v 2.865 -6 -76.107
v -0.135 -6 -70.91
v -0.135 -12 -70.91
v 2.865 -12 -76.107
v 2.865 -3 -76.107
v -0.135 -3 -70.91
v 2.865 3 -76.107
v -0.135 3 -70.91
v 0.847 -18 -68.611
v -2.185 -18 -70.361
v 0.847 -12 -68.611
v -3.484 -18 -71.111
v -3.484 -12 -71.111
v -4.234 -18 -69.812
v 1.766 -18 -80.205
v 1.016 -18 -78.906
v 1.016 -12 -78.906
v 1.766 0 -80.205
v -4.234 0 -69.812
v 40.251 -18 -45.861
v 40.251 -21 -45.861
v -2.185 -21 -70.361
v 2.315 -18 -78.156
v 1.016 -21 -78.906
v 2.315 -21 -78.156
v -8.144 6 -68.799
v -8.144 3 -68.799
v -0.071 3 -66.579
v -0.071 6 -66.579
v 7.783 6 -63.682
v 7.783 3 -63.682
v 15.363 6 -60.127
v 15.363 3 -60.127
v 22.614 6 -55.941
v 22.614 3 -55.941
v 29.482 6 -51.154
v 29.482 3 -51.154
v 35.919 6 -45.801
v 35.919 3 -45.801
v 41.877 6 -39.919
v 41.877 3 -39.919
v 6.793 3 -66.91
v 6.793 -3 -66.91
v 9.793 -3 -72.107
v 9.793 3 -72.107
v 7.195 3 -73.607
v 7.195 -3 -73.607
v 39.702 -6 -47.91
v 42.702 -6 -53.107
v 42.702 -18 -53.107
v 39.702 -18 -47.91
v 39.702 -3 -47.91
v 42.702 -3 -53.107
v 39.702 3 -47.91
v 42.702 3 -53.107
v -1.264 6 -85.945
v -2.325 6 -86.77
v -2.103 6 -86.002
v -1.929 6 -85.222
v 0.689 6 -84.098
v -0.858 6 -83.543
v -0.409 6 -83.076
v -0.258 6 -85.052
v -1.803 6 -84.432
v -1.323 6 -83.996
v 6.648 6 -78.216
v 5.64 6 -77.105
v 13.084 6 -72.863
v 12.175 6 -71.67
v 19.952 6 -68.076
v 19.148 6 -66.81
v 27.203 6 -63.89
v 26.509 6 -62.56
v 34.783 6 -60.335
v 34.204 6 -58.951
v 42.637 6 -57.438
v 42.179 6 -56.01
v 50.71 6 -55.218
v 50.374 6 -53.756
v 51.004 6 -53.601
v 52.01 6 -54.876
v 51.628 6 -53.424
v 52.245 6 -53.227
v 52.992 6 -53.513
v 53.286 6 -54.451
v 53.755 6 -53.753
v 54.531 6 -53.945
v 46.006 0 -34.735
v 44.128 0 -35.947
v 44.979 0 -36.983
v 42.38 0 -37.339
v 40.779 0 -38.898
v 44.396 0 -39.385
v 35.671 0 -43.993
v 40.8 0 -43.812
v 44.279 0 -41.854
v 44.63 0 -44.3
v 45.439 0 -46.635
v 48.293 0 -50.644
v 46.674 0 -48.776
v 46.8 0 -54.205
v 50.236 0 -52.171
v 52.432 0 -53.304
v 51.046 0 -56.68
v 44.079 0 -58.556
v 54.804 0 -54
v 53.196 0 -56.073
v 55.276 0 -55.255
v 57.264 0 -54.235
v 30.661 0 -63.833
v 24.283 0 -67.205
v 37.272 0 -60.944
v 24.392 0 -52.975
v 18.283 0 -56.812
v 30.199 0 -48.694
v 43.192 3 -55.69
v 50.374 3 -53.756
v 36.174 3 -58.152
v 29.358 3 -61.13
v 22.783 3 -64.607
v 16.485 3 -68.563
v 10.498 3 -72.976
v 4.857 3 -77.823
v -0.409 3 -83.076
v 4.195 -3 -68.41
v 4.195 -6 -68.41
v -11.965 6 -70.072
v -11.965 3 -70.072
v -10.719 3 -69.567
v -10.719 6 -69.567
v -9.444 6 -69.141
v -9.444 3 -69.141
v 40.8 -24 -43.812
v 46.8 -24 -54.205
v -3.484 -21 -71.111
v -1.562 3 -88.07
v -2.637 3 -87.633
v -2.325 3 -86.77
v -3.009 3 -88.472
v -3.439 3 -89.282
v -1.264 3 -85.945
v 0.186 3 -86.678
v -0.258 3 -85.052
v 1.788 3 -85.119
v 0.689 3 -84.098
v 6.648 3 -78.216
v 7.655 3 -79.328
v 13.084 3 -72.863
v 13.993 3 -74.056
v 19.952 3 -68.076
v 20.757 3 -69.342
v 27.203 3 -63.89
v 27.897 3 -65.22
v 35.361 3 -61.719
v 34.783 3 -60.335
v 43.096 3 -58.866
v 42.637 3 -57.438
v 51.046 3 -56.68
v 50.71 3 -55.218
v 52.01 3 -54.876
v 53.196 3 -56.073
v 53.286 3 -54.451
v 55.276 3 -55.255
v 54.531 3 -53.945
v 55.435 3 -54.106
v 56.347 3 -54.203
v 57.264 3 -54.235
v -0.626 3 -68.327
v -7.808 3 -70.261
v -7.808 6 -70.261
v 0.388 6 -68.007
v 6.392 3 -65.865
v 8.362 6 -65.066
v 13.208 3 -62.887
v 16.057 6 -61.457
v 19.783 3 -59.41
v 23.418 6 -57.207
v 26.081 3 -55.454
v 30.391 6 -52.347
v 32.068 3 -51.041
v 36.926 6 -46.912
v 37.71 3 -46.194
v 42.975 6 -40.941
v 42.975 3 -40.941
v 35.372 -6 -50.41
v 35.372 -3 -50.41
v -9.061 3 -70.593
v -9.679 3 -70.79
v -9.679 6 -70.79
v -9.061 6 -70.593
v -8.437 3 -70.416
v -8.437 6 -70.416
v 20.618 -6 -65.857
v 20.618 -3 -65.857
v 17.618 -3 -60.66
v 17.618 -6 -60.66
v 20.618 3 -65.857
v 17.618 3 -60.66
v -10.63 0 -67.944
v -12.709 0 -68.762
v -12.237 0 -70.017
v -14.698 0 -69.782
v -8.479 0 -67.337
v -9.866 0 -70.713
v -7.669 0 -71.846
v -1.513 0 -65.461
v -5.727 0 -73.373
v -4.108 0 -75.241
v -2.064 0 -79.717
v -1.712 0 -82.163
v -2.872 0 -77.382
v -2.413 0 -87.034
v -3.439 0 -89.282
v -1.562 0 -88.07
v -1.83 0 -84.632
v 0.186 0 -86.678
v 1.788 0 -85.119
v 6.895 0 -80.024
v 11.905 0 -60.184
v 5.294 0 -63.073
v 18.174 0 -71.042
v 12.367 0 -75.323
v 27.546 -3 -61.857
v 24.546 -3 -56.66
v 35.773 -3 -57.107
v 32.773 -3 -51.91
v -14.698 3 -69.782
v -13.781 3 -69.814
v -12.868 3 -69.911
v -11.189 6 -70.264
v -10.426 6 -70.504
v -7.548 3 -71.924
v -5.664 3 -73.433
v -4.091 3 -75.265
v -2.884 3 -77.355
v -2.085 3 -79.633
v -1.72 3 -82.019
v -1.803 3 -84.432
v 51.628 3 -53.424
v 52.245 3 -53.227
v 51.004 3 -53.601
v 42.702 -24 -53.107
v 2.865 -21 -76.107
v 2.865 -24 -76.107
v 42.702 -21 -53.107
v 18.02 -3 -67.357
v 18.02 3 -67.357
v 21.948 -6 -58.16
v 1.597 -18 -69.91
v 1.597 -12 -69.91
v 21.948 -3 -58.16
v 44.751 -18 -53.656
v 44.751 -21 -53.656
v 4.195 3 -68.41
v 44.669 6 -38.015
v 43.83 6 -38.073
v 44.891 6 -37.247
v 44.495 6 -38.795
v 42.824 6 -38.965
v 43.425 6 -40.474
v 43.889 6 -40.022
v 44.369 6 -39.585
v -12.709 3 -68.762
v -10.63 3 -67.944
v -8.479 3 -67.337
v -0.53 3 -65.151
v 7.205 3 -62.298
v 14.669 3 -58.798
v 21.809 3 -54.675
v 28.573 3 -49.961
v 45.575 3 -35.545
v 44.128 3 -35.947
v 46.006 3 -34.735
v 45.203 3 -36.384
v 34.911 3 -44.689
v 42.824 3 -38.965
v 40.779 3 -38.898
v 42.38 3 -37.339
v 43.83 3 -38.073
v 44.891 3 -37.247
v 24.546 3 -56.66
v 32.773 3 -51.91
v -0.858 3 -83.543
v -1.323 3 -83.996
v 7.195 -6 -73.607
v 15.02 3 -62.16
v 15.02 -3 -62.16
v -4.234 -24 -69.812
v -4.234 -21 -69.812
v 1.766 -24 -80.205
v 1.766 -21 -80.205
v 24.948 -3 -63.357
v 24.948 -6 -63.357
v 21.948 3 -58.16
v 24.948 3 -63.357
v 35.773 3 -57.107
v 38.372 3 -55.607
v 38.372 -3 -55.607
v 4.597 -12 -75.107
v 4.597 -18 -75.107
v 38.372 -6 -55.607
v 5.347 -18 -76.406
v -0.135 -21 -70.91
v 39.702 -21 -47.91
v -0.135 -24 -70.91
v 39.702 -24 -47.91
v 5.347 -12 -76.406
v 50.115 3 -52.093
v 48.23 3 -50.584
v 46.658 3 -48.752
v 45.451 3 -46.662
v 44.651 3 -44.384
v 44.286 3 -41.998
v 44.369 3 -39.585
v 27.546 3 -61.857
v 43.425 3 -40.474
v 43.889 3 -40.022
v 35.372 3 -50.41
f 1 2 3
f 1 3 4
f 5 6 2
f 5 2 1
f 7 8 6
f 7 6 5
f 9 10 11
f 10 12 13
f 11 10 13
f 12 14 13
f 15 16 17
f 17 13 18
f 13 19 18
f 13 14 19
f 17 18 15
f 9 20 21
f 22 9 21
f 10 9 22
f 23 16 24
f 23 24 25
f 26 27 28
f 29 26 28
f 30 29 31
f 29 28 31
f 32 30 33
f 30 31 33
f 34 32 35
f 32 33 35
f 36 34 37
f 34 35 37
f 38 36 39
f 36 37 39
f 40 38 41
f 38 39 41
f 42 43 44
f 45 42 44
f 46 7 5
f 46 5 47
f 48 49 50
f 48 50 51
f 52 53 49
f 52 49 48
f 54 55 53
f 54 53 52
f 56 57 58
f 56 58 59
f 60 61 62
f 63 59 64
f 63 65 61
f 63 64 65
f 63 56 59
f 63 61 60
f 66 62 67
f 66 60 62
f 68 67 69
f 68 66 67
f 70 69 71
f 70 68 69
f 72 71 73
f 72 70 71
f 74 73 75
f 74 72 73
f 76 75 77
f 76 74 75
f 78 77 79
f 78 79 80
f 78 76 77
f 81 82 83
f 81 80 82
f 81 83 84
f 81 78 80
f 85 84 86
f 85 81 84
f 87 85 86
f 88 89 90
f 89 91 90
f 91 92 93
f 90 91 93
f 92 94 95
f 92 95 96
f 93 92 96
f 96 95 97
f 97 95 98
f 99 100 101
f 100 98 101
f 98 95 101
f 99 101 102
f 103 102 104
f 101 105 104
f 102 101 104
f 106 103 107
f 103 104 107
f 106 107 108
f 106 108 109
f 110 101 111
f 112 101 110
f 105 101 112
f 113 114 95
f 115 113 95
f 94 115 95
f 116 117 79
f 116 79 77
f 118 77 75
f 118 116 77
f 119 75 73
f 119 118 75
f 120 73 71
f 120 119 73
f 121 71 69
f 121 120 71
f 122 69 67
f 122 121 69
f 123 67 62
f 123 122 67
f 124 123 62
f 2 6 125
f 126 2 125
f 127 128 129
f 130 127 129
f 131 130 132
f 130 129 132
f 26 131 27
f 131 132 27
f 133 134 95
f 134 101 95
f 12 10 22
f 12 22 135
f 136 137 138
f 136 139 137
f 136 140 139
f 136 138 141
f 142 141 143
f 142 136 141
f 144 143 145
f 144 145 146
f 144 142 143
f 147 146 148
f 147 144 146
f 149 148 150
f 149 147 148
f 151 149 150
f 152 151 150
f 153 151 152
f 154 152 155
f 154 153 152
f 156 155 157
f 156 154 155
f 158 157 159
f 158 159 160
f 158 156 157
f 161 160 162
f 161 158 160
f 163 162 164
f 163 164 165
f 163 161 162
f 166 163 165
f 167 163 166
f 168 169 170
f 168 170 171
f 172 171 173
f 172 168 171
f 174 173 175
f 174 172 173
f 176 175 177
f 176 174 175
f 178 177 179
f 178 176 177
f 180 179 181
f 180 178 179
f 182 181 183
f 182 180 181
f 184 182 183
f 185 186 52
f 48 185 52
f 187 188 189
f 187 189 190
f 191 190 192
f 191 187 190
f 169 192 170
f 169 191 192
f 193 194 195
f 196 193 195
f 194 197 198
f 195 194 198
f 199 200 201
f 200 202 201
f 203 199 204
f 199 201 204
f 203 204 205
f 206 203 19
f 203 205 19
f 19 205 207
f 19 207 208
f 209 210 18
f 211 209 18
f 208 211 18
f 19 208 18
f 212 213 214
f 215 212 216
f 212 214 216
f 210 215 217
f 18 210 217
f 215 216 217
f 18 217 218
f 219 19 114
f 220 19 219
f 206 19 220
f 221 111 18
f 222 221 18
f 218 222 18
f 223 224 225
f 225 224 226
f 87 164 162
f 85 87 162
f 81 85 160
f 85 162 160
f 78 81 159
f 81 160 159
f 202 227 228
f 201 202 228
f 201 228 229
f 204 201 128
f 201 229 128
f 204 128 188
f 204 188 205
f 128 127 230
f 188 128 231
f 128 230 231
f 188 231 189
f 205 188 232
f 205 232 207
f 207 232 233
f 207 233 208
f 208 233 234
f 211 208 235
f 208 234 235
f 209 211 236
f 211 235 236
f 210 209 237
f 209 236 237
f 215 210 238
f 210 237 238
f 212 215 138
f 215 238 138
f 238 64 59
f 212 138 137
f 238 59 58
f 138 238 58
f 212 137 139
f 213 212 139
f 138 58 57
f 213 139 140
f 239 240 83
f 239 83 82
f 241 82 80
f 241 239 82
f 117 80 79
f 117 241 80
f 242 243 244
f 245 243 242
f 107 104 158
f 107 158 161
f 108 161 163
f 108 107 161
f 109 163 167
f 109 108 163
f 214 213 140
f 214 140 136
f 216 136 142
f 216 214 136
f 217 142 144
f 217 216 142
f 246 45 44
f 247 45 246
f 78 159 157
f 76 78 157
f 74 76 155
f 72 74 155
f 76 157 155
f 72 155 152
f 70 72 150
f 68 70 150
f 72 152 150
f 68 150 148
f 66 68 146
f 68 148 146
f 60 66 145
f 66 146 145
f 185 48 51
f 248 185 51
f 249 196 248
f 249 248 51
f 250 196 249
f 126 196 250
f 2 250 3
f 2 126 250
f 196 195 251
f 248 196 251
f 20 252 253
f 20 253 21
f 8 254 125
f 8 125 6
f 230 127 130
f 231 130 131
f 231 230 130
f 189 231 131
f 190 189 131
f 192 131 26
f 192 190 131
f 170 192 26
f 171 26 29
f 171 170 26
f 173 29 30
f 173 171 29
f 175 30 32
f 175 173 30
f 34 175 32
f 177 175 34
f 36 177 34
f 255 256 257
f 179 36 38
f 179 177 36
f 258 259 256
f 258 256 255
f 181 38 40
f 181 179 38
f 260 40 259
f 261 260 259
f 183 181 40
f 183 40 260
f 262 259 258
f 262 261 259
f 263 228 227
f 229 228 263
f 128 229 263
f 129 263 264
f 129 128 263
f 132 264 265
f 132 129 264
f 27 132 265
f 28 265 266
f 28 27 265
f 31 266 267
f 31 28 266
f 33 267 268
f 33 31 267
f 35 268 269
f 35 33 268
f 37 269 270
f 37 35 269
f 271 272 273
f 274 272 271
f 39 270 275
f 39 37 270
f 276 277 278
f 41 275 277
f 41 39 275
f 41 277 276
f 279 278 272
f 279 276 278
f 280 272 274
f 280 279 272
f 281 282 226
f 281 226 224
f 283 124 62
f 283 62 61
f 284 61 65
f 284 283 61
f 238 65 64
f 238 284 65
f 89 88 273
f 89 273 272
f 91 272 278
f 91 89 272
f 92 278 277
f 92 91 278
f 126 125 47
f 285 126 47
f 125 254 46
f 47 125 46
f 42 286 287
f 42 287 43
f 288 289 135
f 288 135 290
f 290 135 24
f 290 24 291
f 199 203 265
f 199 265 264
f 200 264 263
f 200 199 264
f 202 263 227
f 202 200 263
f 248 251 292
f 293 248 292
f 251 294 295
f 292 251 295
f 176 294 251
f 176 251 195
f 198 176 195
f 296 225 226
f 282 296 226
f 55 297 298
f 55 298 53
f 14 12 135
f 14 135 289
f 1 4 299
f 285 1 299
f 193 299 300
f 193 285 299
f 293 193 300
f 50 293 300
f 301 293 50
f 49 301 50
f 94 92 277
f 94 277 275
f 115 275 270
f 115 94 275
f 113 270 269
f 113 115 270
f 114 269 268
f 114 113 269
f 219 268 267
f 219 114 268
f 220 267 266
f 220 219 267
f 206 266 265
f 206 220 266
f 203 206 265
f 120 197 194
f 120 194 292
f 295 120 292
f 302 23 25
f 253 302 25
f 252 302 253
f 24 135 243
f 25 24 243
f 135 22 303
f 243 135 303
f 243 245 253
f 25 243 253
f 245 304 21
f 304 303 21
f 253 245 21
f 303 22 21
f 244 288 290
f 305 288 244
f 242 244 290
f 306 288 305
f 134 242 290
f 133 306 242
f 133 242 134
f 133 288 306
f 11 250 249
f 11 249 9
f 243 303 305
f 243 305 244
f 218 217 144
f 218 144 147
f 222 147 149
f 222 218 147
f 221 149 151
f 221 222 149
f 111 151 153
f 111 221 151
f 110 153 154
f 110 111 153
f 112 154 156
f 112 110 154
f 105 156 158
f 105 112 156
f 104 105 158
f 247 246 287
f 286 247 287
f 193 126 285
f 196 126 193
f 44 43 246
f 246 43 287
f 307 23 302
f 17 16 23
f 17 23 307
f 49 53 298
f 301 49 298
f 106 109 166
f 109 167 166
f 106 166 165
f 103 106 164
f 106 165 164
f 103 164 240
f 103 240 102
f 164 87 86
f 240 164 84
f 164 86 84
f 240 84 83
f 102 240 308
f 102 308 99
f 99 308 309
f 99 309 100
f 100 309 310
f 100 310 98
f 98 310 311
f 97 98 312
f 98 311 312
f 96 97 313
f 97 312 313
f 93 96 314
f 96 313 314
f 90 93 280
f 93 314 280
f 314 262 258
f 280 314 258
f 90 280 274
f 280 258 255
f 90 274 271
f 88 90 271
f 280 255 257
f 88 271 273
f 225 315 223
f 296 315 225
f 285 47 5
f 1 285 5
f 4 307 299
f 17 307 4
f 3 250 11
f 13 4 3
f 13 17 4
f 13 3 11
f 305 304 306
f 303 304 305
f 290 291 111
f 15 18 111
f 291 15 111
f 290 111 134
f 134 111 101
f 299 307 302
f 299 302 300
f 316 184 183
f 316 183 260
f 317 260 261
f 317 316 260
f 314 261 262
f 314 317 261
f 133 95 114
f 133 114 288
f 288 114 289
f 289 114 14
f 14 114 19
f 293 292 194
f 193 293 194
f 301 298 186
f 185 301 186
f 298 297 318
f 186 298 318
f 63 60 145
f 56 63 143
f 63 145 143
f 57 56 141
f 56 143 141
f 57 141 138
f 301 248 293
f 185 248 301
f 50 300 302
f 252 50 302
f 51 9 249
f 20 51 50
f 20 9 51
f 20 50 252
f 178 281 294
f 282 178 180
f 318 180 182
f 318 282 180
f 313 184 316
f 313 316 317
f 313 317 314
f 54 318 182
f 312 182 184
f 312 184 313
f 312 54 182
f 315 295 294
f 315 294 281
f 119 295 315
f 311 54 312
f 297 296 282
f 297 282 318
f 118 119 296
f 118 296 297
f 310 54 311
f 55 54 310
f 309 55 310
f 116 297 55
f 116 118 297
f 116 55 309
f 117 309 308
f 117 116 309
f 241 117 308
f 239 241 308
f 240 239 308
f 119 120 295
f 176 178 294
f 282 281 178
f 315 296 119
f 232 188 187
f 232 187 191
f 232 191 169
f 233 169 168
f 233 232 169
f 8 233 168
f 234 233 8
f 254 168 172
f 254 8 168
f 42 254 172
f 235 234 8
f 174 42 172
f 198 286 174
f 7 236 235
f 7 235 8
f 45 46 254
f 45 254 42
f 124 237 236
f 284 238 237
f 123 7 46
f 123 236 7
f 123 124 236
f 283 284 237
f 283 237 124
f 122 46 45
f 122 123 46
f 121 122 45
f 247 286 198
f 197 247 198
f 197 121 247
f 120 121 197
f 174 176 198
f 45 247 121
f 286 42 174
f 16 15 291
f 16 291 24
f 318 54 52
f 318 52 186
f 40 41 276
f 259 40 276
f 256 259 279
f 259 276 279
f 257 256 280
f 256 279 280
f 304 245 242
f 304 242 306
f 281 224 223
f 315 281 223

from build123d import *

# Parameters (mm, degrees)
BOSS_EXTRUDE1_DEPTH  = 3
BOSS_EXTRUDE4_DEPTH  = 3
SKETCH11_R           = 13
CUT_EXTRUDE2_DEPTH   = 6.5
BOSS_EXTRUDE5_DEPTH  = 3
CUT_EXTRUDE3_DEPTH   = 24
BOSS_EXTRUDE6_DEPTH  = 3
BOSS_EXTRUDE7_DEPTH  = 6
CUT_EXTRUDE4_DEPTH   = 3
BOSS_EXTRUDE8_DEPTH  = 12
BOSS_EXTRUDE10_DEPTH = 3
BOSS_EXTRUDE11_DEPTH = 3
SKETCH21_W           = 9
SKETCH21_H           = 6
CUT_EXTRUDE5_DEPTH   = 5


with BuildPart() as part:
    # Sketch3 → Boss-Extrude1 (new body)
    with BuildSketch(Plane(origin=(0, 0, 0), x_dir=(1, 0, 0), z_dir=(0, 1, 0))):
        with BuildLine():
            ThreePointArc((-3.439345798, 89.282032024), (-25.956006297, 89.282032024), (-14.697676047, 69.782032024))
            ThreePointArc((-14.697676047, 69.782032024), (-5.505287892, 73.589643868), (-1.697676047, 82.782032024))
            ThreePointArc((-1.697676047, 82.782032024), (-2.140640306, 86.14667961), (-3.439345798, 89.282032024))
        make_face()
        with BuildLine():
            ThreePointArc((-3.439345798, 89.282032024), (-0.67063629, 87.395724301), (1.787544185, 85.119486633))
            ThreePointArc((1.787544185, 85.119486633), (24.283086066, 67.204681754), (51.045533135, 56.680373453))
            ThreePointArc((51.045533135, 56.680373453), (54.245903018, 55.689645548), (57.26384818, 54.23502664))
            ThreePointArc((57.26384818, 54.23502664), (46.005517931, 47.73502664), (46.005517931, 34.73502664))
            ThreePointArc((46.005517931, 34.73502664), (43.236808422, 36.621334362), (40.778627947, 38.89757203))
            ThreePointArc((40.778627947, 38.89757203), (18.283086066, 56.812376909), (-8.479361003, 67.336685211))
            ThreePointArc((-8.479361003, 67.336685211), (-11.679730886, 68.327413115), (-14.697676047, 69.782032024))
            ThreePointArc((-14.697676047, 69.782032024), (-3.439345798, 76.282032024), (-3.439345798, 89.282032024))
        make_face()
        with BuildLine():
            ThreePointArc((57.26384818, 54.23502664), (46.005517931, 47.73502664), (46.005517931, 34.73502664))
            ThreePointArc((46.005517931, 34.73502664), (60.628495766, 28.677990898), (70.26384818, 41.23502664))
            ThreePointArc((70.26384818, 41.23502664), (66.456236335, 50.427414795), (57.26384818, 54.23502664))
        make_face()
    extrude(amount=BOSS_EXTRUDE1_DEPTH)

    # Sketch10 → Boss-Extrude4 (add)
    with BuildSketch(Plane(origin=(0, 3, 0), x_dir=(1, 0, 0), z_dir=(0, 1, 0))):
        with BuildLine():
            ThreePointArc((-4.545374861, 88.183955812), (-24.656968191, 88.532032024), (-14.299728684, 71.288919395))
            ThreePointArc((-14.299728684, 71.288919395), (-11.320648952, 69.799088737), (-8.143608603, 68.798625813))
            ThreePointArc((-8.143608603, 68.798625813), (19.033086066, 58.111415015), (41.876829448, 39.91931244))
            ThreePointArc((41.876829448, 39.91931244), (44.33177593, 37.66814625), (47.111546993, 35.833102851))
            ThreePointArc((47.111546993, 35.833102851), (67.223140323, 35.48502664), (56.865900817, 52.728139268))
            ThreePointArc((56.865900817, 52.728139268), (53.886821084, 54.217969926), (50.709780735, 55.21843285))
            ThreePointArc((50.709780735, 55.21843285), (23.533086066, 65.905643649), (0.689342684, 84.097746224))
            ThreePointArc((0.689342684, 84.097746224), (-1.765603798, 86.348912413), (-4.545374861, 88.183955812))
        make_face()
        with BuildLine():
            ThreePointArc((-5.671220706, 87.085879601), (-23.357930085, 87.782032024), (-13.911689713, 72.812968603))
            ThreePointArc((-13.911689713, 72.812968603), (-10.968716852, 71.276238274), (-7.807856203, 70.260566416))
            ThreePointArc((-7.807856203, 70.260566416), (19.783086066, 59.41045312), (42.975030949, 40.941052849))
            ThreePointArc((42.975030949, 40.941052849), (45.435058904, 38.711503158), (48.237392838, 36.931179062))
            ThreePointArc((48.237392838, 36.931179062), (65.924102218, 36.23502664), (56.477861845, 51.20409006))
            ThreePointArc((56.477861845, 51.20409006), (53.534888984, 52.740820389), (50.374028335, 53.756492247))
            ThreePointArc((50.374028335, 53.756492247), (22.783086066, 64.606605543), (-0.408858816, 83.076005814))
            ThreePointArc((-0.408858816, 83.076005814), (-2.868886772, 85.305555505), (-5.671220706, 87.085879601))
        make_face(mode=Mode.SUBTRACT)
    extrude(amount=BOSS_EXTRUDE4_DEPTH)

    # Sketch11 → Cut-Extrude2 (cut, symmetric)
    with BuildSketch(Plane(origin=(0, 3, 0), x_dir=(1, 0, 0), z_dir=(0, 1, 0))):
        with Locations((-14.697676047, 82.782032024)):
            Circle(SKETCH11_R)
        with Locations((57.26384818, 41.23502664)):
            Circle(SKETCH11_R)
    extrude(amount=CUT_EXTRUDE2_DEPTH, both=True, mode=Mode.SUBTRACT)

    # Sketch12 → Boss-Extrude5 (add)
    with BuildSketch(Plane.XZ):
        Polygon((-4.233574432, -69.812376909), (1.766425568, -80.204681754), (46.799746565, -54.204681754), (40.799746565, -43.812376909), align=None)
        Polygon((2.864501779, -76.106605543), (42.701670353, -53.106605543), (39.701670353, -47.91045312), (-0.135498221, -70.91045312), align=None, mode=Mode.SUBTRACT)
    extrude(amount=BOSS_EXTRUDE5_DEPTH)

    # Sketch13 → Cut-Extrude3 (cut)
    with BuildSketch(Plane.XZ):
        Polygon((39.701670353, -47.91045312), (-0.135498221, -70.91045312), (2.864501779, -76.106605543), (42.701670353, -53.106605543), align=None)
    extrude(amount=-CUT_EXTRUDE3_DEPTH, mode=Mode.SUBTRACT)

    # Sketch14 → Boss-Extrude6 (add)
    with BuildSketch(Plane.XZ.offset(3)):
        Polygon((40.799746565, -43.812376909), (-4.233574432, -69.812376909), (1.766425568, -80.204681754), (46.799746565, -54.204681754), align=None)
    extrude(amount=BOSS_EXTRUDE6_DEPTH)

    # Sketch15 → Boss-Extrude7 (add)
    with BuildSketch(Plane(origin=(0, -3, 0), x_dir=(1, 0, 0), z_dir=(0, 1, 0))):
        Polygon((4.194628798, 68.41045312), (6.792705009, 66.91045312), (9.792705009, 72.106605543), (7.194628798, 73.606605543), align=None)
        Polygon((18.019946345, 67.356605543), (15.019946345, 62.16045312), (17.618022557, 60.66045312), (20.618022557, 65.856605543), align=None)
        Polygon((24.948149576, 63.356605543), (21.948149576, 58.16045312), (24.546225787, 56.66045312), (27.546225787, 61.856605543), align=None)
        Polygon((35.773467123, 57.106605543), (32.773467123, 51.91045312), (35.371543334, 50.41045312), (38.371543334, 55.606605543), align=None)
    extrude(amount=BOSS_EXTRUDE7_DEPTH)

    # Sketch16 → Cut-Extrude4 (cut)
    with BuildSketch(Plane(origin=(0, -3, 0), x_dir=(1, 0, 0), z_dir=(0, 1, 0))):
        Polygon((42.701670353, 53.106605543), (38.371543334, 55.606605543), (35.371543334, 50.41045312), (39.701670353, 47.91045312), align=None)
        Polygon((24.948149576, 63.356605543), (20.618022557, 65.856605543), (17.618022557, 60.66045312), (21.948149576, 58.16045312), align=None)
        Polygon((-0.135498221, 70.91045312), (4.194628798, 68.41045312), (7.194628798, 73.606605543), (2.864501779, 76.106605543), align=None)
    extrude(amount=-CUT_EXTRUDE4_DEPTH, mode=Mode.SUBTRACT)

    # Sketch17 → Boss-Extrude8 (add)
    with BuildSketch(Plane.XZ.offset(6)):
        Polygon((46.799746565, -54.204681754), (40.799746565, -43.812376909), (-4.233574432, -69.812376909), (1.766425568, -80.204681754), align=None)
        Polygon((42.701670353, -53.106605543), (39.701670353, -47.91045312), (-0.135498221, -70.91045312), (2.864501779, -76.106605543), align=None, mode=Mode.SUBTRACT)
    extrude(amount=BOSS_EXTRUDE8_DEPTH)

    # Sketch19 → Boss-Extrude10 (add)
    with BuildSketch(Plane.XZ.offset(18)):
        Polygon((2.315463673, -78.155643649), (44.750708459, -53.655643649), (40.250708459, -45.861415015), (-2.184536327, -70.361415015), (-3.483574432, -71.111415015), (-4.233574432, -69.812376909), (40.799746565, -43.812376909), (46.799746565, -54.204681754), (1.766425568, -80.204681754), (1.016425568, -78.905643649), align=None)
    extrude(amount=BOSS_EXTRUDE10_DEPTH)

    # Sketch20 → Boss-Extrude11 (add)
    with BuildSketch(Plane.XZ.offset(21)):
        Polygon((1.766425568, -80.204681754), (46.799746565, -54.204681754), (40.799746565, -43.812376909), (-4.233574432, -69.812376909), align=None)
        Polygon((42.701670353, -53.106605543), (39.701670353, -47.91045312), (-0.135498221, -70.91045312), (2.864501779, -76.106605543), align=None, mode=Mode.SUBTRACT)
    extrude(amount=BOSS_EXTRUDE11_DEPTH)

    # Sketch21 → Cut-Extrude5 (cut)
    with BuildSketch(Plane(origin=(-33.404826775, 0, -19.286285731), x_dir=(-0.5000000000000008, 0, 0.8660254037844383), z_dir=(-0.8660254037844382, 0, -0.5000000000000007))):
        with Locations((-64.342504686, -15)):
            Rectangle(SKETCH21_W, SKETCH21_H)
    extrude(amount=-CUT_EXTRUDE5_DEPTH, mode=Mode.SUBTRACT)


solid = part.part
